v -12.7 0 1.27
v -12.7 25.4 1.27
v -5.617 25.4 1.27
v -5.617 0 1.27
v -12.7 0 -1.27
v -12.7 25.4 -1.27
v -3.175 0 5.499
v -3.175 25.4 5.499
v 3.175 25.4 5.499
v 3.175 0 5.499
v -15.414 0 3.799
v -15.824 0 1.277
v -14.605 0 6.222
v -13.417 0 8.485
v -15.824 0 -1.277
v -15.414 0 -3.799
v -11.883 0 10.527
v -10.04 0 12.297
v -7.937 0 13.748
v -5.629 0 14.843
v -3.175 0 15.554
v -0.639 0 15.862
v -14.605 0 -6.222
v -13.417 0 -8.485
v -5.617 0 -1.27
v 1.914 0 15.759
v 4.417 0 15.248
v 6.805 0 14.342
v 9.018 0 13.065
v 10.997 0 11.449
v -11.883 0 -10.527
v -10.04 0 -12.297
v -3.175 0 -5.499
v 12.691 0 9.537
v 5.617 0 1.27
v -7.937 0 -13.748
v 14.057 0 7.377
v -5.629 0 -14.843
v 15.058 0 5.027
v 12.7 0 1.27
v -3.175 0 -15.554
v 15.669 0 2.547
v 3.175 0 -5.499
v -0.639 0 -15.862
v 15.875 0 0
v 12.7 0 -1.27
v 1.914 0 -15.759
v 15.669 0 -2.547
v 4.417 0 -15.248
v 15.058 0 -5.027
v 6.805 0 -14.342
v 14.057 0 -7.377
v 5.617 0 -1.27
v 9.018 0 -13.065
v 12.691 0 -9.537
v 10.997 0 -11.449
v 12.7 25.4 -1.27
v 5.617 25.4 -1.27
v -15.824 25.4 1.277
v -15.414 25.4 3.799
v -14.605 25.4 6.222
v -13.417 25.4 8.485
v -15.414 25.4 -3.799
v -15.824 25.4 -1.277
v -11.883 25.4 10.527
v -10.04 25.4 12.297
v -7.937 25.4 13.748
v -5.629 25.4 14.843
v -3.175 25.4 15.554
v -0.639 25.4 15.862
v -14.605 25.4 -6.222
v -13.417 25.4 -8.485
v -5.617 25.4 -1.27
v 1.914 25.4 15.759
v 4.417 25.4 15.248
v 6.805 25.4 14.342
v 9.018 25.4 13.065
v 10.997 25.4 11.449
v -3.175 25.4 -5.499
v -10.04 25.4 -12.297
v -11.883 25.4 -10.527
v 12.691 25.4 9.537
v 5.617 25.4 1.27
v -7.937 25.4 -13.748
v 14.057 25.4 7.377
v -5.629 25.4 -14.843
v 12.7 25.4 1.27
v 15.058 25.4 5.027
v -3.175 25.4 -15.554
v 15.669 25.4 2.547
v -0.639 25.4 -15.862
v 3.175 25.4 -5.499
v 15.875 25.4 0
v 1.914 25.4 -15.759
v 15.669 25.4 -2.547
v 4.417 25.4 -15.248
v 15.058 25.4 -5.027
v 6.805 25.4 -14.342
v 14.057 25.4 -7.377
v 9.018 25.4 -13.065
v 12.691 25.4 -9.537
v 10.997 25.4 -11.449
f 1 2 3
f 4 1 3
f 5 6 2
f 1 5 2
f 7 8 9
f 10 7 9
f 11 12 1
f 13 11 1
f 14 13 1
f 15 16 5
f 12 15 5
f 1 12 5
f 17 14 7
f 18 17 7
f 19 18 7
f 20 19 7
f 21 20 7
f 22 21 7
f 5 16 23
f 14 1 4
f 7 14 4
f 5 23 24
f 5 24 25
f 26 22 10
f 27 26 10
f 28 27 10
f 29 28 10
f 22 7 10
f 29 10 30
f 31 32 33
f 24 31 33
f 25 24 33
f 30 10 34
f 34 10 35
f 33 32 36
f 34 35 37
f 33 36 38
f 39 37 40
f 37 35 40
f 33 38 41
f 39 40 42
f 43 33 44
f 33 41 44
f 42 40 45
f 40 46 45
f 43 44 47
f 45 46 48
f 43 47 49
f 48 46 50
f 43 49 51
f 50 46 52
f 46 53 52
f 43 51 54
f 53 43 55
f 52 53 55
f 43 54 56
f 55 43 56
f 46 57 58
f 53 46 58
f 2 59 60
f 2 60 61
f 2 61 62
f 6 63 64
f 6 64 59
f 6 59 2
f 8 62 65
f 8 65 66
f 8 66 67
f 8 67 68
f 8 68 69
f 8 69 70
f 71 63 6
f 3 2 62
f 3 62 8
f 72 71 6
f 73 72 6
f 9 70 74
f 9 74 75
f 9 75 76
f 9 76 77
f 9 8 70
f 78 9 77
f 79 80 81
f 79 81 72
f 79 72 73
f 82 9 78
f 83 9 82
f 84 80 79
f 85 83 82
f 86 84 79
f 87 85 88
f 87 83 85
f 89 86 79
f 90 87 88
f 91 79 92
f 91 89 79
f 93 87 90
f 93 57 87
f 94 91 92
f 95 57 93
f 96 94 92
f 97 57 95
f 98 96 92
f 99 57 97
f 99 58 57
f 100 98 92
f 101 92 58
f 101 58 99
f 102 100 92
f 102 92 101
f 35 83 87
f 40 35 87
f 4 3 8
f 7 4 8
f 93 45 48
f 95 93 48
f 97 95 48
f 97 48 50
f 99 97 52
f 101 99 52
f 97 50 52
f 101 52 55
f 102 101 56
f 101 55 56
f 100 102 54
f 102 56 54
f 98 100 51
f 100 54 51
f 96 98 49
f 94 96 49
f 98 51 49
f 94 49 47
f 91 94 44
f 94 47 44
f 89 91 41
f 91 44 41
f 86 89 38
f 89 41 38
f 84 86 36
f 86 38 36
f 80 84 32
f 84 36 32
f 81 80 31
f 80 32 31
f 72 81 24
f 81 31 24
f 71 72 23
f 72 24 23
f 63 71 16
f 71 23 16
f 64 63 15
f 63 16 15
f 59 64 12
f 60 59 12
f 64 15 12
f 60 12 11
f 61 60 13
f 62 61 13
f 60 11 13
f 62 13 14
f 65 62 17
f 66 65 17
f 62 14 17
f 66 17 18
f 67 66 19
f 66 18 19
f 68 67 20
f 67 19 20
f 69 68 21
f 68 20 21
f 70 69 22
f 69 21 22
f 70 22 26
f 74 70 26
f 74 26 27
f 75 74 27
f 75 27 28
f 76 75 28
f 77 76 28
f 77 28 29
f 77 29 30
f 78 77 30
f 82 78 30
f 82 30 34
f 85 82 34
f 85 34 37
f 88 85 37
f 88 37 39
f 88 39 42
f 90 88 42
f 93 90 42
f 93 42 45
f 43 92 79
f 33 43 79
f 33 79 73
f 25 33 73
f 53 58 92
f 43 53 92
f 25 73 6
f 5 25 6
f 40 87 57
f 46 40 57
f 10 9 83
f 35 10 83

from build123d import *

# Parameters (mm, degrees)
SKETCH1_R           = 15.875
BOSS_EXTRUDE1_DEPTH = 25.4
CUT_EXTRUDE1_DEPTH  = 26.4


with BuildPart() as part:
    # Sketch1 → Boss-Extrude1 (new body)
    with BuildSketch(Plane(origin=(0, 0, 0), x_dir=(1, 0, 0), z_dir=(0, 1, 0))):
        Circle(SKETCH1_R)
    extrude(amount=BOSS_EXTRUDE1_DEPTH)

    # Sketch2 → Cut-Extrude1 (cut, through all)
    with BuildSketch(Plane(origin=(0, 25.4, 0), x_dir=(1, 0, 0), z_dir=(0, 1, 0))):
        Polygon((-6.35, 0), (-5.616765158, 1.27), (-12.7, 1.27), (-12.7, -1.27), (-5.616765158, -1.27), align=None)
        Polygon((3.175, -5.499261314), (5.616765158, -1.27), (-5.616765158, -1.27), (-3.175, -5.499261314), align=None)
        Polygon((6.35, 0), (5.616765158, 1.27), (-5.616765158, 1.27), (-6.35, 0), (-5.616765158, -1.27), (5.616765158, -1.27), align=None)
        Polygon((5.616765158, 1.27), (3.175, 5.499261314), (-3.175, 5.499261314), (-5.616765158, 1.27), align=None)
        Polygon((12.7, 1.27), (5.616765158, 1.27), (6.35, 0), (5.616765158, -1.27), (12.7, -1.27), align=None)
    extrude(amount=-CUT_EXTRUDE1_DEPTH, mode=Mode.SUBTRACT)


solid = part.part
